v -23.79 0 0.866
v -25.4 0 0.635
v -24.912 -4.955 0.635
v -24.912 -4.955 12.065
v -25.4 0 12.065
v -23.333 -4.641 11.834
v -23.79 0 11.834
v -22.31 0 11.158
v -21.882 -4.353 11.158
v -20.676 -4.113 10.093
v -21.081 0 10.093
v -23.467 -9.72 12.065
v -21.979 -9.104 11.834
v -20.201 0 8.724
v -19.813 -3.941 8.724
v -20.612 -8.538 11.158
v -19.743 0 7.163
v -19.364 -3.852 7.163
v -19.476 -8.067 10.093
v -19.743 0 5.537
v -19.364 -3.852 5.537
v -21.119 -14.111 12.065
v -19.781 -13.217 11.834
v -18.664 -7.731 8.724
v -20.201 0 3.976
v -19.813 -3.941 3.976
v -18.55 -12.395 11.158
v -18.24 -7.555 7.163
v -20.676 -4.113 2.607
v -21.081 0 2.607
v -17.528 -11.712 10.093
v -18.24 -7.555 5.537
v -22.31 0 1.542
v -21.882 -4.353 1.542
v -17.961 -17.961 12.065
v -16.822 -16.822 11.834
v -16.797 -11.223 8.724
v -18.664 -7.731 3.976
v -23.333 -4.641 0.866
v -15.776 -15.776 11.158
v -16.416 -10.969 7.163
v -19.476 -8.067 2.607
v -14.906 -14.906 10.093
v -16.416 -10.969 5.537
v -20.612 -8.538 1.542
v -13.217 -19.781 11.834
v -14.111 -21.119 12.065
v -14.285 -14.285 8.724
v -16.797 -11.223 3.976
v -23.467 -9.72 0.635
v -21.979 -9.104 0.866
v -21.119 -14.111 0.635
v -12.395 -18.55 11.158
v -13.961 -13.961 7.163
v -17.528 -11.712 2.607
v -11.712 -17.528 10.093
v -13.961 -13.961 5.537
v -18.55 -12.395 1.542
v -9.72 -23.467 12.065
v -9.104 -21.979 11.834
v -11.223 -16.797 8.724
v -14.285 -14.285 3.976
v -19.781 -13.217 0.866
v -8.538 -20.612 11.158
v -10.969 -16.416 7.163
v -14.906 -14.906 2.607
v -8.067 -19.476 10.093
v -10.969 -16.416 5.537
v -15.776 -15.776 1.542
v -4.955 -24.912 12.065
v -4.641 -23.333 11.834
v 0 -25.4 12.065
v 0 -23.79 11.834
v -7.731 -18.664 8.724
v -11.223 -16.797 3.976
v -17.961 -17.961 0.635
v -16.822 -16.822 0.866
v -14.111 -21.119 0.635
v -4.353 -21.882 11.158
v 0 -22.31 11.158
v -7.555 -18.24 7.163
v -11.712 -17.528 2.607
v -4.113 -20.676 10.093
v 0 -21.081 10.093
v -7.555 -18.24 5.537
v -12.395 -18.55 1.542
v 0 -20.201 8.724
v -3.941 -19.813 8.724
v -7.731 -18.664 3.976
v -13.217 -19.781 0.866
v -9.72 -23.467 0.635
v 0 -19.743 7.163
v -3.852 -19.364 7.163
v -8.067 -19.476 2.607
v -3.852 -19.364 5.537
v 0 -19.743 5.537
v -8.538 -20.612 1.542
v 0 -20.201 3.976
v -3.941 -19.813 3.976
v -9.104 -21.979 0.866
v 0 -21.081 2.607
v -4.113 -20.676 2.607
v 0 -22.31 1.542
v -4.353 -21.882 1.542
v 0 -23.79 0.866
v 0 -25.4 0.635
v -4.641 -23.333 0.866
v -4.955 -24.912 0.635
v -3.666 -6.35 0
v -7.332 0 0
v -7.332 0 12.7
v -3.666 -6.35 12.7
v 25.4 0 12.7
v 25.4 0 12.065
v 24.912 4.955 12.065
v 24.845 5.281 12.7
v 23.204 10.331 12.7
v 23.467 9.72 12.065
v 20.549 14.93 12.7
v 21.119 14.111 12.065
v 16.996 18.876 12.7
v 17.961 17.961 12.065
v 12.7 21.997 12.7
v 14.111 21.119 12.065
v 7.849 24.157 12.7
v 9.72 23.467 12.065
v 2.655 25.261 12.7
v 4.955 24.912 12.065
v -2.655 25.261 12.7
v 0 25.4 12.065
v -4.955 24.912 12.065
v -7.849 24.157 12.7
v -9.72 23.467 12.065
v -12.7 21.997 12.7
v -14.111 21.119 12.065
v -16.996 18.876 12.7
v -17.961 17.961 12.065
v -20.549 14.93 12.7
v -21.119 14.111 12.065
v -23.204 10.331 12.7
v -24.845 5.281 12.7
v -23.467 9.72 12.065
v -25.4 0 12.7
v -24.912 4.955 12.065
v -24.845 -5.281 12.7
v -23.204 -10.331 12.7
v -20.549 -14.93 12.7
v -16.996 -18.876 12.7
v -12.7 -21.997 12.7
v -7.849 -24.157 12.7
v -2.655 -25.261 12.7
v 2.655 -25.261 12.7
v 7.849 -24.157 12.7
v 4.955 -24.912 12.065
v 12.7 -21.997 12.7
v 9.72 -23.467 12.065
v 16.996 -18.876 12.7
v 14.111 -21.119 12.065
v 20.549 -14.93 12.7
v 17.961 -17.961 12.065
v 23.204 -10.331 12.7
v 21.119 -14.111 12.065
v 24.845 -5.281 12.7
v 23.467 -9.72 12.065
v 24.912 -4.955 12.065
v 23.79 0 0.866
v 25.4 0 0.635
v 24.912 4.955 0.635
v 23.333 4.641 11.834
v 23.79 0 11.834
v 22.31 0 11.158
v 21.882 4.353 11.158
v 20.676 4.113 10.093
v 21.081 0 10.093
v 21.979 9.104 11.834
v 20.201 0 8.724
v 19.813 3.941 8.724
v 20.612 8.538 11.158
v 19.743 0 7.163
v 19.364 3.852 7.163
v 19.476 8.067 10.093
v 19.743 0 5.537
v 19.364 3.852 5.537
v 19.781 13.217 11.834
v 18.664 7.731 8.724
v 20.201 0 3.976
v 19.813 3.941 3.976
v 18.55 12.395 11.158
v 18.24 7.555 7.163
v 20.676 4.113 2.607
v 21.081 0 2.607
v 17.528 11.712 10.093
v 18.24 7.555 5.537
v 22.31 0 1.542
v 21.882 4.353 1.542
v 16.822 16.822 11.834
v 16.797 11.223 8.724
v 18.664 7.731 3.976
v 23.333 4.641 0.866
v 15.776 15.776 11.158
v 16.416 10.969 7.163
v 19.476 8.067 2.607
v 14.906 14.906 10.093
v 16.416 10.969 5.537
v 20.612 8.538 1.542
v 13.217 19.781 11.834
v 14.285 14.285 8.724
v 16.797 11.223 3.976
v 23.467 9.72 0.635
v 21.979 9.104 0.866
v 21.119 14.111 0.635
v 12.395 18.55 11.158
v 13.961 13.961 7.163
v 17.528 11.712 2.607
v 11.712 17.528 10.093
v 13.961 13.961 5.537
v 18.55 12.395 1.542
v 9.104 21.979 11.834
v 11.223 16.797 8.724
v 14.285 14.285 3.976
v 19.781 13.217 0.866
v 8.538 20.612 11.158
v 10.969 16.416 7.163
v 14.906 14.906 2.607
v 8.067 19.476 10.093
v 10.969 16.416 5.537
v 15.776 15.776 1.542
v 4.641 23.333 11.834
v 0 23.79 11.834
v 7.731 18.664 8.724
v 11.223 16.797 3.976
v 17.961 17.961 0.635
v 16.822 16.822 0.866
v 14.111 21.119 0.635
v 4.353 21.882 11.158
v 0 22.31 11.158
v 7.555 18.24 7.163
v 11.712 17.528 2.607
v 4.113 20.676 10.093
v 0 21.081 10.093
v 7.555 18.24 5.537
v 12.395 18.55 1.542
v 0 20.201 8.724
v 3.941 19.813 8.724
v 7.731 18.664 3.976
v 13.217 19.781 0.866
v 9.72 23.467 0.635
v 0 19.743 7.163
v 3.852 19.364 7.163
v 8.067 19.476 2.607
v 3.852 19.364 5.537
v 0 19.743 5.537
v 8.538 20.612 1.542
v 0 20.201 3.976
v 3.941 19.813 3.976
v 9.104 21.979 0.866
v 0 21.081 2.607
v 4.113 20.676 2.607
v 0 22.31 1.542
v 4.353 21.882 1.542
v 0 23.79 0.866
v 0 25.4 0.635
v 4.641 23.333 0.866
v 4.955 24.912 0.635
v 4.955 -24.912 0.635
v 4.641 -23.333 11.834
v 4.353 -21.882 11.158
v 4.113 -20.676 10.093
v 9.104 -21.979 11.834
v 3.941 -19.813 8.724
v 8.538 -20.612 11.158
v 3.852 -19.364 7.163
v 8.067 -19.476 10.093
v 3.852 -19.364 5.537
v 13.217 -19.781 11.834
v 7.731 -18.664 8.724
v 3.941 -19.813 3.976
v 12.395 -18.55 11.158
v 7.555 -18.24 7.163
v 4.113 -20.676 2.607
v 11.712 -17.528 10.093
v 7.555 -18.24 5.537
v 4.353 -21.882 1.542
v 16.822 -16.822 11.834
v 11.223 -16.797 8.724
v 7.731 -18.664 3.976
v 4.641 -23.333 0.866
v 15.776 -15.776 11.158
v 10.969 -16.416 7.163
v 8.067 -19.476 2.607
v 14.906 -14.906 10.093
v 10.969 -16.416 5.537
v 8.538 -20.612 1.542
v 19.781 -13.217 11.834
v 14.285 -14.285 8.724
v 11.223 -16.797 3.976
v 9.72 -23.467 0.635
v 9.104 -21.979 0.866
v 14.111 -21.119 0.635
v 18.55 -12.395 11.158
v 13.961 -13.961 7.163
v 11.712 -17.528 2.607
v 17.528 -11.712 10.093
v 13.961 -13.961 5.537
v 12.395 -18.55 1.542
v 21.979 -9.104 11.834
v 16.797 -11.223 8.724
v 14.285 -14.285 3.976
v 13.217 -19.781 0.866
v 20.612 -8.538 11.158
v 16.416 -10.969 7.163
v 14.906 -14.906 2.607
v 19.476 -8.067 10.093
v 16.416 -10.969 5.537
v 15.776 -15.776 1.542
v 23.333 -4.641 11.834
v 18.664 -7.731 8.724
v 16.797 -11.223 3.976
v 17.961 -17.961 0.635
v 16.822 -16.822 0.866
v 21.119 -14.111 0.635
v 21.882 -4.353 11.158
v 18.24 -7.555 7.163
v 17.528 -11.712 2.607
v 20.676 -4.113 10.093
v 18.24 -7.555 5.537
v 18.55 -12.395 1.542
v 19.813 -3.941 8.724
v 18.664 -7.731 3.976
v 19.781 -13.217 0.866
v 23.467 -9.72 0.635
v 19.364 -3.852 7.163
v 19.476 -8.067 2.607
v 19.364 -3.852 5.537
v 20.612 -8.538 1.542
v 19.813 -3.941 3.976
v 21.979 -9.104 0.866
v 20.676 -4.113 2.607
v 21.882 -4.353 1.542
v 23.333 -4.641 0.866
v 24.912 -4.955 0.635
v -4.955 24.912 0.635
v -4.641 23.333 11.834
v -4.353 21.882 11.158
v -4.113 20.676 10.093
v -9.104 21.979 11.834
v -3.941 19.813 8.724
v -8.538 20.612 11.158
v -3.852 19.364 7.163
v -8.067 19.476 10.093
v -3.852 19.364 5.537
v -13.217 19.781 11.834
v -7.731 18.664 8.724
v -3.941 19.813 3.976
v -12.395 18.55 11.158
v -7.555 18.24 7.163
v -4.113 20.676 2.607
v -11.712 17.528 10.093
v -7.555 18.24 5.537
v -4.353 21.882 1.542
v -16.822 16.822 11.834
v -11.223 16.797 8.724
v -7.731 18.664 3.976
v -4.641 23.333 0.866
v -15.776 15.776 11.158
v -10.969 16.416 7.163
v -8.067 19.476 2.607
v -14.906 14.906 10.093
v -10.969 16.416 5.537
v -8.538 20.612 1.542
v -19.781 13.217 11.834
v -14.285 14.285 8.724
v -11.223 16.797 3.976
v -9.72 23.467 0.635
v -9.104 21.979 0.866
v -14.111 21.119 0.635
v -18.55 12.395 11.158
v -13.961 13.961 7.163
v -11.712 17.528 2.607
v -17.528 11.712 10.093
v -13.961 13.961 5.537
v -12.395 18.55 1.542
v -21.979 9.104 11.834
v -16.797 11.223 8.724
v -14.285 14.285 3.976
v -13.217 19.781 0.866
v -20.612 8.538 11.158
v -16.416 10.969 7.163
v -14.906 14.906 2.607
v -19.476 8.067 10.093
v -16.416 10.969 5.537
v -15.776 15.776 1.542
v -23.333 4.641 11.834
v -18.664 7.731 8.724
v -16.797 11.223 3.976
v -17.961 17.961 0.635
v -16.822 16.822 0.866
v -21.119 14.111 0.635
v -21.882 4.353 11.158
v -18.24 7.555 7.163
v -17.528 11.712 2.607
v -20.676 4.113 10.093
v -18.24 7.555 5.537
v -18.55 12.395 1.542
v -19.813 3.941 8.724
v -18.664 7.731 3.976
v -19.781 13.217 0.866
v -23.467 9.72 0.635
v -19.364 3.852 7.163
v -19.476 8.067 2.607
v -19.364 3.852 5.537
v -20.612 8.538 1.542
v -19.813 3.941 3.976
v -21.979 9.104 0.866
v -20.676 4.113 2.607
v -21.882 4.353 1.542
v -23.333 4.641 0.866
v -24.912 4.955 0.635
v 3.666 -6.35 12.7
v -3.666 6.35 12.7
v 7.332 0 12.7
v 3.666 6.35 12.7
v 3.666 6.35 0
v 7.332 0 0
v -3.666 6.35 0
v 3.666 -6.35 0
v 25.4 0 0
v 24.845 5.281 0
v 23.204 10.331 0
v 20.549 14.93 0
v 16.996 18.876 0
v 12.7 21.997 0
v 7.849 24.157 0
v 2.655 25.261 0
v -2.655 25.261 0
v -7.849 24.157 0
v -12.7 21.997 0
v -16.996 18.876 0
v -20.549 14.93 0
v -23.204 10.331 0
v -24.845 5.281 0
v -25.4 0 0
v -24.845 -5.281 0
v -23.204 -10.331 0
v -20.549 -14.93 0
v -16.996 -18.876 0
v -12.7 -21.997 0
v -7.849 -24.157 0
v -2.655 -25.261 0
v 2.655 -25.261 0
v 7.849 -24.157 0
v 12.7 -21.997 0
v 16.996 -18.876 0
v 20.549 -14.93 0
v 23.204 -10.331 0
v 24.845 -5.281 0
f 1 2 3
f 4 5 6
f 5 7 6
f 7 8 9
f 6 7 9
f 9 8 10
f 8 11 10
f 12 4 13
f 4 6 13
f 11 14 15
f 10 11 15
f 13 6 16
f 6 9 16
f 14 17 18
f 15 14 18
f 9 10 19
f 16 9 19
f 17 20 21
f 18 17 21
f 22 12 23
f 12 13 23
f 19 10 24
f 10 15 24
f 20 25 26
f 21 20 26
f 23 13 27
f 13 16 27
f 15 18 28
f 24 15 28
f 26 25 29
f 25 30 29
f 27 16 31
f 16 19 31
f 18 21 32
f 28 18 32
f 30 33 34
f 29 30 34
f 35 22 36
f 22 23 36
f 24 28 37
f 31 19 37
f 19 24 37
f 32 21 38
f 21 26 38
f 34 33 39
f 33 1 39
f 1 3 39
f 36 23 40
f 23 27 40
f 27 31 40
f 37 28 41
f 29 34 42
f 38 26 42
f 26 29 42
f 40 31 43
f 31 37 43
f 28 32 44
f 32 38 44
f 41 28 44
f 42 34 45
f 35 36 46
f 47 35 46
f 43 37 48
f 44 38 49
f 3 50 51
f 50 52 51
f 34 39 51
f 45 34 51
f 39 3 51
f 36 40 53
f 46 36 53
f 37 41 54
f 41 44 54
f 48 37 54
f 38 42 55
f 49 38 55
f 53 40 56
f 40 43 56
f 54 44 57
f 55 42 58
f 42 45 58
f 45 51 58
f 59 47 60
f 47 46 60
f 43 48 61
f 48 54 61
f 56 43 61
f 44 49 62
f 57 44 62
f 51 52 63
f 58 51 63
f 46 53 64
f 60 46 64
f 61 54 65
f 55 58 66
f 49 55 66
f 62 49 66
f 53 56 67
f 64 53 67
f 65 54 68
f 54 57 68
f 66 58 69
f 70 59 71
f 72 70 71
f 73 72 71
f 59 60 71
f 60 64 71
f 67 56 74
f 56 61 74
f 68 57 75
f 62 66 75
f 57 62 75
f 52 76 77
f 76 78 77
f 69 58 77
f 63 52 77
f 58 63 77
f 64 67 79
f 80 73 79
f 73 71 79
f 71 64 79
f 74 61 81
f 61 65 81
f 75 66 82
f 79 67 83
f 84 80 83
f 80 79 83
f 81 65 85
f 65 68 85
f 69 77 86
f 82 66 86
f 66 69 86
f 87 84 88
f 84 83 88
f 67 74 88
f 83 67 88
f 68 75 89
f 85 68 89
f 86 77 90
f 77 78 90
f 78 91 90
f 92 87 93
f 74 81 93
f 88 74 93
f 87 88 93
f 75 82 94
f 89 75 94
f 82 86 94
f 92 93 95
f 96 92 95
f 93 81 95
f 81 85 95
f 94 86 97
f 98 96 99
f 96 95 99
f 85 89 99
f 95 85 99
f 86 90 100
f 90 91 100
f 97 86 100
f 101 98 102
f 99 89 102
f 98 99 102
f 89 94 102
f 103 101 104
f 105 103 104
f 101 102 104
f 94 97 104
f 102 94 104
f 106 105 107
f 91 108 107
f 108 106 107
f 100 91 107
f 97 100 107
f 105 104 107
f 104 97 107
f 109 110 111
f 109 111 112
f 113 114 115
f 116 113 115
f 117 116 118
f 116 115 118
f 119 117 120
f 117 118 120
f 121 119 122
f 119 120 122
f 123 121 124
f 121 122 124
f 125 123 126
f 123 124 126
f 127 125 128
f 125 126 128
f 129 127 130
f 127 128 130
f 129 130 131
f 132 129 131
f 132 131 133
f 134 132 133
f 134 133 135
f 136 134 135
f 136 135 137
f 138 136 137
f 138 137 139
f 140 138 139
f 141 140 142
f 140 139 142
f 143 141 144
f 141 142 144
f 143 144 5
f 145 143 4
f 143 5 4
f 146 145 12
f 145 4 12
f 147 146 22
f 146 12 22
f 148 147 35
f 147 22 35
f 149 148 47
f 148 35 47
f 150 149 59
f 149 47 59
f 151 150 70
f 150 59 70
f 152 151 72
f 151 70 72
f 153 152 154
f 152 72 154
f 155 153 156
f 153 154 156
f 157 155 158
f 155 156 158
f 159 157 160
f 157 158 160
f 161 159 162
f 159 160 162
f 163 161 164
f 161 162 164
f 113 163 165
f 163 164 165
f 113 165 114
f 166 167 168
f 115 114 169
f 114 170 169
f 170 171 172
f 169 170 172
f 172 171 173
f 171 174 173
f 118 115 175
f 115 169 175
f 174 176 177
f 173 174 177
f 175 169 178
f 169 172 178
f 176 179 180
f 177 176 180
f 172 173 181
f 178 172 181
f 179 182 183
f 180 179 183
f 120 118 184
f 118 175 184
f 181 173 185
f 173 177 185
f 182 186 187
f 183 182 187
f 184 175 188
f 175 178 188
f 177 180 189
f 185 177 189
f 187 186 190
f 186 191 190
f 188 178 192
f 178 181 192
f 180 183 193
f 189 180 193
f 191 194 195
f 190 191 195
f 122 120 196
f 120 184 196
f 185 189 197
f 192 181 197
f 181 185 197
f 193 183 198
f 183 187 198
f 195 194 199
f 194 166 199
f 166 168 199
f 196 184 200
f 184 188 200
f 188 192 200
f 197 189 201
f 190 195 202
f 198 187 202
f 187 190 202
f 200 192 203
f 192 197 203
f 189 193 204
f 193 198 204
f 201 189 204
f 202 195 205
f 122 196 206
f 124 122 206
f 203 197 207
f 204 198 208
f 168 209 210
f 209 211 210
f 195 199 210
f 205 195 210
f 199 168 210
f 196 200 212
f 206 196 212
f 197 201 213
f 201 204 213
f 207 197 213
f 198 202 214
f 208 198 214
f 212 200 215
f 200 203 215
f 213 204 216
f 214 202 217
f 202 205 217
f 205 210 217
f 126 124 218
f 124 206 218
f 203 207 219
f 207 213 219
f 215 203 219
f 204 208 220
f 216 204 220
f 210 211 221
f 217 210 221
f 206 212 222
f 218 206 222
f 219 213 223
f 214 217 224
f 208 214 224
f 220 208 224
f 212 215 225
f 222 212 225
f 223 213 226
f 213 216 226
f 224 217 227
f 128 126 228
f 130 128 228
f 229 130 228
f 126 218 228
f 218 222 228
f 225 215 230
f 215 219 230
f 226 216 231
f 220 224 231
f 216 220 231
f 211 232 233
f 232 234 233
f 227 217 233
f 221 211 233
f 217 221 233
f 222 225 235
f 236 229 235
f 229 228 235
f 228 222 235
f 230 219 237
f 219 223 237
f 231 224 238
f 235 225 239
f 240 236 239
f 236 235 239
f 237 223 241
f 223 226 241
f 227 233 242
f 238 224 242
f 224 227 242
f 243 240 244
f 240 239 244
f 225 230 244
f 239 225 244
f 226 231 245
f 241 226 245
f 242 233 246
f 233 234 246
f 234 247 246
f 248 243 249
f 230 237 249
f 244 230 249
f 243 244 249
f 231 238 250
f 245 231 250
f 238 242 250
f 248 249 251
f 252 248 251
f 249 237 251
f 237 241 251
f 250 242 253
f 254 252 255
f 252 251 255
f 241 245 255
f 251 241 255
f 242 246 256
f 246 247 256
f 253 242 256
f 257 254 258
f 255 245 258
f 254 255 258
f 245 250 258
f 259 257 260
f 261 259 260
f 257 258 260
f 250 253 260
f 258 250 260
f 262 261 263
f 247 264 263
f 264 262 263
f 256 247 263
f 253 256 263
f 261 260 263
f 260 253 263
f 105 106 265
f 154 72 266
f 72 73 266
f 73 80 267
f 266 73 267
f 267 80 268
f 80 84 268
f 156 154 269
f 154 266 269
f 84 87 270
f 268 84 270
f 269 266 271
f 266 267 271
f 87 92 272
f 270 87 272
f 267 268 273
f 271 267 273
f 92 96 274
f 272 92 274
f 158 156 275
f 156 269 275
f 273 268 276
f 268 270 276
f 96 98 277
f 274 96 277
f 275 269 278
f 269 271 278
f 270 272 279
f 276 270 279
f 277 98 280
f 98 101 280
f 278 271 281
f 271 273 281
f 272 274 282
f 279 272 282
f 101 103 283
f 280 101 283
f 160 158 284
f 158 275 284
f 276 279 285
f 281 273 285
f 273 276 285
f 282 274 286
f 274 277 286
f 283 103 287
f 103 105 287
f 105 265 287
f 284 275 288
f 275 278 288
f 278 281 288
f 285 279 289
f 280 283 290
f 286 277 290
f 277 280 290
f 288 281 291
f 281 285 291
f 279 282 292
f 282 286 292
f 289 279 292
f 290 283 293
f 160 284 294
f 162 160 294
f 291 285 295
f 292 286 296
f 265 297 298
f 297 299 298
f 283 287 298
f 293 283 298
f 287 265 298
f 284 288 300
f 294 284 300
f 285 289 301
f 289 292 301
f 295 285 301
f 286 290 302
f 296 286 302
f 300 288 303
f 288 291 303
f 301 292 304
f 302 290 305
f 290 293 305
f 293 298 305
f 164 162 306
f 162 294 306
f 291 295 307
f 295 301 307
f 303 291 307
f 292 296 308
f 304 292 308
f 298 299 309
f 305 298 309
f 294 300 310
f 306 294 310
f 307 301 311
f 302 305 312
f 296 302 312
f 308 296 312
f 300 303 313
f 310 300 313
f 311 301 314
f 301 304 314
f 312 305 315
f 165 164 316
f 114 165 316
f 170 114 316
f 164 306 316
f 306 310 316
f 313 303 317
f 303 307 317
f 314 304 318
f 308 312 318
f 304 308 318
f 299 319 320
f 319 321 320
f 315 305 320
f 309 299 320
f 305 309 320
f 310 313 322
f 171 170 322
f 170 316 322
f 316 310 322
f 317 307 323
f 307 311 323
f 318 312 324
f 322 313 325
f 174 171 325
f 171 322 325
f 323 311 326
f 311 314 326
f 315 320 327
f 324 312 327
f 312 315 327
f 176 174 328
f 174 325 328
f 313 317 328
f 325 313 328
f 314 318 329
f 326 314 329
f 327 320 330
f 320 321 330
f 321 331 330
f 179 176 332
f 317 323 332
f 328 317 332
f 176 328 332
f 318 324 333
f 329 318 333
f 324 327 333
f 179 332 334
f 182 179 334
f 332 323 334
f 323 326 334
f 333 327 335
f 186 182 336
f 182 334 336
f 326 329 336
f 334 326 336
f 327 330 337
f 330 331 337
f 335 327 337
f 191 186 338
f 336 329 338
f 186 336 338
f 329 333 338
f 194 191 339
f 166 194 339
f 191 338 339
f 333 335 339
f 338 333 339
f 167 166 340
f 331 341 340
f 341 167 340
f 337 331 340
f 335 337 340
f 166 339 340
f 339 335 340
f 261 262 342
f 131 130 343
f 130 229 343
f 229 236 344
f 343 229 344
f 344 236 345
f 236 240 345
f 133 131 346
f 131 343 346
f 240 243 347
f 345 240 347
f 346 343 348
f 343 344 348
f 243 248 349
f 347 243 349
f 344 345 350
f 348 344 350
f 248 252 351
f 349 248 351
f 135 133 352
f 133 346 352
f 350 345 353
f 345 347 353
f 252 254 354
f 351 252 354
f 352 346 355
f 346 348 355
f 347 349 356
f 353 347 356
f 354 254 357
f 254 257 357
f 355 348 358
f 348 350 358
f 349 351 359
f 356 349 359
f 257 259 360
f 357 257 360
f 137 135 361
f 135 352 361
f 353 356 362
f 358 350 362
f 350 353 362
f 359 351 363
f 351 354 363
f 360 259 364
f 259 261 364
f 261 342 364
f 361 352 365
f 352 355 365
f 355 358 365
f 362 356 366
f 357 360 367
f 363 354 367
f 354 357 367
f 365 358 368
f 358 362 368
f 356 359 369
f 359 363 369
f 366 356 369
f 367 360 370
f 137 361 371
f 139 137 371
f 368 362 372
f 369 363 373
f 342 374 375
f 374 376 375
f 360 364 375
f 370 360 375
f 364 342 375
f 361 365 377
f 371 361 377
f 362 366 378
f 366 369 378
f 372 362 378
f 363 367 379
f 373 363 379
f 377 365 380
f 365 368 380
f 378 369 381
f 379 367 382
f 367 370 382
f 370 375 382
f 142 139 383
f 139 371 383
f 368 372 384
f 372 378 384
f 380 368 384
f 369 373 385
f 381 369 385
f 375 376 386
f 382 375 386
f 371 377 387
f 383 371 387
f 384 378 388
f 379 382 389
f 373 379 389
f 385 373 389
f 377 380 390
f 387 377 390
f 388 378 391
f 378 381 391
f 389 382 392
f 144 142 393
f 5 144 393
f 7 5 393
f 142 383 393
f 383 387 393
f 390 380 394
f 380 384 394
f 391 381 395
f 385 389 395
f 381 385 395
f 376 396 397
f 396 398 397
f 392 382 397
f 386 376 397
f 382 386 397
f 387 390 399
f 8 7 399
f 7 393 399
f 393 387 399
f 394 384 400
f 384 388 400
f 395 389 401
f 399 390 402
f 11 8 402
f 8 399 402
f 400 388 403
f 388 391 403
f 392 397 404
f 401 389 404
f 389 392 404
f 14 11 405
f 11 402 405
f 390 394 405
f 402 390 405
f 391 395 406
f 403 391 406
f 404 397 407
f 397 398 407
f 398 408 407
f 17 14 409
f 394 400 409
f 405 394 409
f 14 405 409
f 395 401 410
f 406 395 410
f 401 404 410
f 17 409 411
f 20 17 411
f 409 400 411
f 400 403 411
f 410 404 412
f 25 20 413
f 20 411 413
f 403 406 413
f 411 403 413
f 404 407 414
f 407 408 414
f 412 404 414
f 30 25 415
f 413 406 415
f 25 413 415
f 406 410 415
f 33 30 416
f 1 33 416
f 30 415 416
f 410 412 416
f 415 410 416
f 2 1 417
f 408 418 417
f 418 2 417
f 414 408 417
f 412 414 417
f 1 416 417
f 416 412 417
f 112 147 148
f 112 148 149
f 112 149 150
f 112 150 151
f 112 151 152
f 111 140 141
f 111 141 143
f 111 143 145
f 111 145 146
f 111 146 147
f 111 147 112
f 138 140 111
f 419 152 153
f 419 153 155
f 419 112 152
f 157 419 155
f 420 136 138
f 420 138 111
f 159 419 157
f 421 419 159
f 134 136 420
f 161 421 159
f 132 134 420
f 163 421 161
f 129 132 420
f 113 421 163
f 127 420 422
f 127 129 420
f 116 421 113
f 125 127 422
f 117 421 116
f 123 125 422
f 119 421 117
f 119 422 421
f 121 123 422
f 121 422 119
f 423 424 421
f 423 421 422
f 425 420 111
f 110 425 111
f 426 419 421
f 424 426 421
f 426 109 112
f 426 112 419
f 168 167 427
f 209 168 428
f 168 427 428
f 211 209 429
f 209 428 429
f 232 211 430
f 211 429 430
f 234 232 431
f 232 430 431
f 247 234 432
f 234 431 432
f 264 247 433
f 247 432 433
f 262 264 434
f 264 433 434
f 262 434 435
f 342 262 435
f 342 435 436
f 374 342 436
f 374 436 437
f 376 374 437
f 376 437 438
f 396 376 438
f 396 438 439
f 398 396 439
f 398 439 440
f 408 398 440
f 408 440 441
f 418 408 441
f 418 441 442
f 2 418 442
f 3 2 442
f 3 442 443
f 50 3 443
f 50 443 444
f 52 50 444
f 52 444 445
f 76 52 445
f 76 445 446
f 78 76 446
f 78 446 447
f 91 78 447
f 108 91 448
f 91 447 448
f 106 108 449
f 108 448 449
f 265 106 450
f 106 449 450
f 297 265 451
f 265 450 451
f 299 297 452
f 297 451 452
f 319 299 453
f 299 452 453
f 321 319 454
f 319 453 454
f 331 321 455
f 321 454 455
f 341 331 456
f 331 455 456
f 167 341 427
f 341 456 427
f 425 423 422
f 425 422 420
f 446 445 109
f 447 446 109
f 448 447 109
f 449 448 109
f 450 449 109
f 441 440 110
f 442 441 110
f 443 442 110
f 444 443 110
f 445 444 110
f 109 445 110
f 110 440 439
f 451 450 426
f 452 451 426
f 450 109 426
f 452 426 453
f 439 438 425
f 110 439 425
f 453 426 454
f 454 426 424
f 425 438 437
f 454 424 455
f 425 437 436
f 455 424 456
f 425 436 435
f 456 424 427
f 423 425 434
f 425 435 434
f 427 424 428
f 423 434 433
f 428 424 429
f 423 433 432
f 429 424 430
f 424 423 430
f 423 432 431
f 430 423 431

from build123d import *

# Parameters (mm, degrees)
SKETCH2_R           = 25.4
BOSS_EXTRUDE2_DEPTH = 12.7
CUT_EXTRUDE2_DEPTH  = 17.272


with BuildPart() as part:
    # Sketch2 → Boss-Extrude2 (new body)
    with BuildSketch(Plane.XY):
        Circle(SKETCH2_R)
    extrude(amount=BOSS_EXTRUDE2_DEPTH)

    # Cut-Sweep2: sweep along a curve in space
    with BuildLine() as cut_sweep2_path:
        ThreePointArc((25.4, 0, 12.7), (17.960512242, 17.960512242, 12.7), (0, 25.4, 12.7))
        ThreePointArc((0, 25.4, 12.7), (-17.960512242, 17.960512242, 12.7), (-25.4, 0, 12.7))
        ThreePointArc((-25.4, 0, 12.7), (-17.960512242, -17.960512242, 12.7), (0, -25.4, 12.7))
        ThreePointArc((0, -25.4, 12.7), (17.960512242, -17.960512242, 12.7), (25.4, 0, 12.7))
    # Sketch3 → Cut-Sweep2 (sweep, cut)
    with BuildSketch(Plane(origin=(0, 0, 0), x_dir=(0, 0, -1), z_dir=(1, 0, 0))):
        with BuildLine():
            Line((-12.065, 25.4), (-0.635, 25.4))
            ThreePointArc((-0.635, 25.4), (-6.35, 19.685), (-12.065, 25.4))
        make_face()
    sweep(path=cut_sweep2_path.line, mode=Mode.SUBTRACT)

    # Sketch22 → Cut-Extrude2 (cut)
    with BuildSketch(Plane.XY):
        Polygon((7.332348419, 0), (3.666174209, 6.35), (-3.666174209, 6.35), (-7.332348419, 0), (-3.666174209, -6.35), (3.666174209, -6.35), align=None)
    extrude(amount=CUT_EXTRUDE2_DEPTH, mode=Mode.SUBTRACT)


solid = part.part
